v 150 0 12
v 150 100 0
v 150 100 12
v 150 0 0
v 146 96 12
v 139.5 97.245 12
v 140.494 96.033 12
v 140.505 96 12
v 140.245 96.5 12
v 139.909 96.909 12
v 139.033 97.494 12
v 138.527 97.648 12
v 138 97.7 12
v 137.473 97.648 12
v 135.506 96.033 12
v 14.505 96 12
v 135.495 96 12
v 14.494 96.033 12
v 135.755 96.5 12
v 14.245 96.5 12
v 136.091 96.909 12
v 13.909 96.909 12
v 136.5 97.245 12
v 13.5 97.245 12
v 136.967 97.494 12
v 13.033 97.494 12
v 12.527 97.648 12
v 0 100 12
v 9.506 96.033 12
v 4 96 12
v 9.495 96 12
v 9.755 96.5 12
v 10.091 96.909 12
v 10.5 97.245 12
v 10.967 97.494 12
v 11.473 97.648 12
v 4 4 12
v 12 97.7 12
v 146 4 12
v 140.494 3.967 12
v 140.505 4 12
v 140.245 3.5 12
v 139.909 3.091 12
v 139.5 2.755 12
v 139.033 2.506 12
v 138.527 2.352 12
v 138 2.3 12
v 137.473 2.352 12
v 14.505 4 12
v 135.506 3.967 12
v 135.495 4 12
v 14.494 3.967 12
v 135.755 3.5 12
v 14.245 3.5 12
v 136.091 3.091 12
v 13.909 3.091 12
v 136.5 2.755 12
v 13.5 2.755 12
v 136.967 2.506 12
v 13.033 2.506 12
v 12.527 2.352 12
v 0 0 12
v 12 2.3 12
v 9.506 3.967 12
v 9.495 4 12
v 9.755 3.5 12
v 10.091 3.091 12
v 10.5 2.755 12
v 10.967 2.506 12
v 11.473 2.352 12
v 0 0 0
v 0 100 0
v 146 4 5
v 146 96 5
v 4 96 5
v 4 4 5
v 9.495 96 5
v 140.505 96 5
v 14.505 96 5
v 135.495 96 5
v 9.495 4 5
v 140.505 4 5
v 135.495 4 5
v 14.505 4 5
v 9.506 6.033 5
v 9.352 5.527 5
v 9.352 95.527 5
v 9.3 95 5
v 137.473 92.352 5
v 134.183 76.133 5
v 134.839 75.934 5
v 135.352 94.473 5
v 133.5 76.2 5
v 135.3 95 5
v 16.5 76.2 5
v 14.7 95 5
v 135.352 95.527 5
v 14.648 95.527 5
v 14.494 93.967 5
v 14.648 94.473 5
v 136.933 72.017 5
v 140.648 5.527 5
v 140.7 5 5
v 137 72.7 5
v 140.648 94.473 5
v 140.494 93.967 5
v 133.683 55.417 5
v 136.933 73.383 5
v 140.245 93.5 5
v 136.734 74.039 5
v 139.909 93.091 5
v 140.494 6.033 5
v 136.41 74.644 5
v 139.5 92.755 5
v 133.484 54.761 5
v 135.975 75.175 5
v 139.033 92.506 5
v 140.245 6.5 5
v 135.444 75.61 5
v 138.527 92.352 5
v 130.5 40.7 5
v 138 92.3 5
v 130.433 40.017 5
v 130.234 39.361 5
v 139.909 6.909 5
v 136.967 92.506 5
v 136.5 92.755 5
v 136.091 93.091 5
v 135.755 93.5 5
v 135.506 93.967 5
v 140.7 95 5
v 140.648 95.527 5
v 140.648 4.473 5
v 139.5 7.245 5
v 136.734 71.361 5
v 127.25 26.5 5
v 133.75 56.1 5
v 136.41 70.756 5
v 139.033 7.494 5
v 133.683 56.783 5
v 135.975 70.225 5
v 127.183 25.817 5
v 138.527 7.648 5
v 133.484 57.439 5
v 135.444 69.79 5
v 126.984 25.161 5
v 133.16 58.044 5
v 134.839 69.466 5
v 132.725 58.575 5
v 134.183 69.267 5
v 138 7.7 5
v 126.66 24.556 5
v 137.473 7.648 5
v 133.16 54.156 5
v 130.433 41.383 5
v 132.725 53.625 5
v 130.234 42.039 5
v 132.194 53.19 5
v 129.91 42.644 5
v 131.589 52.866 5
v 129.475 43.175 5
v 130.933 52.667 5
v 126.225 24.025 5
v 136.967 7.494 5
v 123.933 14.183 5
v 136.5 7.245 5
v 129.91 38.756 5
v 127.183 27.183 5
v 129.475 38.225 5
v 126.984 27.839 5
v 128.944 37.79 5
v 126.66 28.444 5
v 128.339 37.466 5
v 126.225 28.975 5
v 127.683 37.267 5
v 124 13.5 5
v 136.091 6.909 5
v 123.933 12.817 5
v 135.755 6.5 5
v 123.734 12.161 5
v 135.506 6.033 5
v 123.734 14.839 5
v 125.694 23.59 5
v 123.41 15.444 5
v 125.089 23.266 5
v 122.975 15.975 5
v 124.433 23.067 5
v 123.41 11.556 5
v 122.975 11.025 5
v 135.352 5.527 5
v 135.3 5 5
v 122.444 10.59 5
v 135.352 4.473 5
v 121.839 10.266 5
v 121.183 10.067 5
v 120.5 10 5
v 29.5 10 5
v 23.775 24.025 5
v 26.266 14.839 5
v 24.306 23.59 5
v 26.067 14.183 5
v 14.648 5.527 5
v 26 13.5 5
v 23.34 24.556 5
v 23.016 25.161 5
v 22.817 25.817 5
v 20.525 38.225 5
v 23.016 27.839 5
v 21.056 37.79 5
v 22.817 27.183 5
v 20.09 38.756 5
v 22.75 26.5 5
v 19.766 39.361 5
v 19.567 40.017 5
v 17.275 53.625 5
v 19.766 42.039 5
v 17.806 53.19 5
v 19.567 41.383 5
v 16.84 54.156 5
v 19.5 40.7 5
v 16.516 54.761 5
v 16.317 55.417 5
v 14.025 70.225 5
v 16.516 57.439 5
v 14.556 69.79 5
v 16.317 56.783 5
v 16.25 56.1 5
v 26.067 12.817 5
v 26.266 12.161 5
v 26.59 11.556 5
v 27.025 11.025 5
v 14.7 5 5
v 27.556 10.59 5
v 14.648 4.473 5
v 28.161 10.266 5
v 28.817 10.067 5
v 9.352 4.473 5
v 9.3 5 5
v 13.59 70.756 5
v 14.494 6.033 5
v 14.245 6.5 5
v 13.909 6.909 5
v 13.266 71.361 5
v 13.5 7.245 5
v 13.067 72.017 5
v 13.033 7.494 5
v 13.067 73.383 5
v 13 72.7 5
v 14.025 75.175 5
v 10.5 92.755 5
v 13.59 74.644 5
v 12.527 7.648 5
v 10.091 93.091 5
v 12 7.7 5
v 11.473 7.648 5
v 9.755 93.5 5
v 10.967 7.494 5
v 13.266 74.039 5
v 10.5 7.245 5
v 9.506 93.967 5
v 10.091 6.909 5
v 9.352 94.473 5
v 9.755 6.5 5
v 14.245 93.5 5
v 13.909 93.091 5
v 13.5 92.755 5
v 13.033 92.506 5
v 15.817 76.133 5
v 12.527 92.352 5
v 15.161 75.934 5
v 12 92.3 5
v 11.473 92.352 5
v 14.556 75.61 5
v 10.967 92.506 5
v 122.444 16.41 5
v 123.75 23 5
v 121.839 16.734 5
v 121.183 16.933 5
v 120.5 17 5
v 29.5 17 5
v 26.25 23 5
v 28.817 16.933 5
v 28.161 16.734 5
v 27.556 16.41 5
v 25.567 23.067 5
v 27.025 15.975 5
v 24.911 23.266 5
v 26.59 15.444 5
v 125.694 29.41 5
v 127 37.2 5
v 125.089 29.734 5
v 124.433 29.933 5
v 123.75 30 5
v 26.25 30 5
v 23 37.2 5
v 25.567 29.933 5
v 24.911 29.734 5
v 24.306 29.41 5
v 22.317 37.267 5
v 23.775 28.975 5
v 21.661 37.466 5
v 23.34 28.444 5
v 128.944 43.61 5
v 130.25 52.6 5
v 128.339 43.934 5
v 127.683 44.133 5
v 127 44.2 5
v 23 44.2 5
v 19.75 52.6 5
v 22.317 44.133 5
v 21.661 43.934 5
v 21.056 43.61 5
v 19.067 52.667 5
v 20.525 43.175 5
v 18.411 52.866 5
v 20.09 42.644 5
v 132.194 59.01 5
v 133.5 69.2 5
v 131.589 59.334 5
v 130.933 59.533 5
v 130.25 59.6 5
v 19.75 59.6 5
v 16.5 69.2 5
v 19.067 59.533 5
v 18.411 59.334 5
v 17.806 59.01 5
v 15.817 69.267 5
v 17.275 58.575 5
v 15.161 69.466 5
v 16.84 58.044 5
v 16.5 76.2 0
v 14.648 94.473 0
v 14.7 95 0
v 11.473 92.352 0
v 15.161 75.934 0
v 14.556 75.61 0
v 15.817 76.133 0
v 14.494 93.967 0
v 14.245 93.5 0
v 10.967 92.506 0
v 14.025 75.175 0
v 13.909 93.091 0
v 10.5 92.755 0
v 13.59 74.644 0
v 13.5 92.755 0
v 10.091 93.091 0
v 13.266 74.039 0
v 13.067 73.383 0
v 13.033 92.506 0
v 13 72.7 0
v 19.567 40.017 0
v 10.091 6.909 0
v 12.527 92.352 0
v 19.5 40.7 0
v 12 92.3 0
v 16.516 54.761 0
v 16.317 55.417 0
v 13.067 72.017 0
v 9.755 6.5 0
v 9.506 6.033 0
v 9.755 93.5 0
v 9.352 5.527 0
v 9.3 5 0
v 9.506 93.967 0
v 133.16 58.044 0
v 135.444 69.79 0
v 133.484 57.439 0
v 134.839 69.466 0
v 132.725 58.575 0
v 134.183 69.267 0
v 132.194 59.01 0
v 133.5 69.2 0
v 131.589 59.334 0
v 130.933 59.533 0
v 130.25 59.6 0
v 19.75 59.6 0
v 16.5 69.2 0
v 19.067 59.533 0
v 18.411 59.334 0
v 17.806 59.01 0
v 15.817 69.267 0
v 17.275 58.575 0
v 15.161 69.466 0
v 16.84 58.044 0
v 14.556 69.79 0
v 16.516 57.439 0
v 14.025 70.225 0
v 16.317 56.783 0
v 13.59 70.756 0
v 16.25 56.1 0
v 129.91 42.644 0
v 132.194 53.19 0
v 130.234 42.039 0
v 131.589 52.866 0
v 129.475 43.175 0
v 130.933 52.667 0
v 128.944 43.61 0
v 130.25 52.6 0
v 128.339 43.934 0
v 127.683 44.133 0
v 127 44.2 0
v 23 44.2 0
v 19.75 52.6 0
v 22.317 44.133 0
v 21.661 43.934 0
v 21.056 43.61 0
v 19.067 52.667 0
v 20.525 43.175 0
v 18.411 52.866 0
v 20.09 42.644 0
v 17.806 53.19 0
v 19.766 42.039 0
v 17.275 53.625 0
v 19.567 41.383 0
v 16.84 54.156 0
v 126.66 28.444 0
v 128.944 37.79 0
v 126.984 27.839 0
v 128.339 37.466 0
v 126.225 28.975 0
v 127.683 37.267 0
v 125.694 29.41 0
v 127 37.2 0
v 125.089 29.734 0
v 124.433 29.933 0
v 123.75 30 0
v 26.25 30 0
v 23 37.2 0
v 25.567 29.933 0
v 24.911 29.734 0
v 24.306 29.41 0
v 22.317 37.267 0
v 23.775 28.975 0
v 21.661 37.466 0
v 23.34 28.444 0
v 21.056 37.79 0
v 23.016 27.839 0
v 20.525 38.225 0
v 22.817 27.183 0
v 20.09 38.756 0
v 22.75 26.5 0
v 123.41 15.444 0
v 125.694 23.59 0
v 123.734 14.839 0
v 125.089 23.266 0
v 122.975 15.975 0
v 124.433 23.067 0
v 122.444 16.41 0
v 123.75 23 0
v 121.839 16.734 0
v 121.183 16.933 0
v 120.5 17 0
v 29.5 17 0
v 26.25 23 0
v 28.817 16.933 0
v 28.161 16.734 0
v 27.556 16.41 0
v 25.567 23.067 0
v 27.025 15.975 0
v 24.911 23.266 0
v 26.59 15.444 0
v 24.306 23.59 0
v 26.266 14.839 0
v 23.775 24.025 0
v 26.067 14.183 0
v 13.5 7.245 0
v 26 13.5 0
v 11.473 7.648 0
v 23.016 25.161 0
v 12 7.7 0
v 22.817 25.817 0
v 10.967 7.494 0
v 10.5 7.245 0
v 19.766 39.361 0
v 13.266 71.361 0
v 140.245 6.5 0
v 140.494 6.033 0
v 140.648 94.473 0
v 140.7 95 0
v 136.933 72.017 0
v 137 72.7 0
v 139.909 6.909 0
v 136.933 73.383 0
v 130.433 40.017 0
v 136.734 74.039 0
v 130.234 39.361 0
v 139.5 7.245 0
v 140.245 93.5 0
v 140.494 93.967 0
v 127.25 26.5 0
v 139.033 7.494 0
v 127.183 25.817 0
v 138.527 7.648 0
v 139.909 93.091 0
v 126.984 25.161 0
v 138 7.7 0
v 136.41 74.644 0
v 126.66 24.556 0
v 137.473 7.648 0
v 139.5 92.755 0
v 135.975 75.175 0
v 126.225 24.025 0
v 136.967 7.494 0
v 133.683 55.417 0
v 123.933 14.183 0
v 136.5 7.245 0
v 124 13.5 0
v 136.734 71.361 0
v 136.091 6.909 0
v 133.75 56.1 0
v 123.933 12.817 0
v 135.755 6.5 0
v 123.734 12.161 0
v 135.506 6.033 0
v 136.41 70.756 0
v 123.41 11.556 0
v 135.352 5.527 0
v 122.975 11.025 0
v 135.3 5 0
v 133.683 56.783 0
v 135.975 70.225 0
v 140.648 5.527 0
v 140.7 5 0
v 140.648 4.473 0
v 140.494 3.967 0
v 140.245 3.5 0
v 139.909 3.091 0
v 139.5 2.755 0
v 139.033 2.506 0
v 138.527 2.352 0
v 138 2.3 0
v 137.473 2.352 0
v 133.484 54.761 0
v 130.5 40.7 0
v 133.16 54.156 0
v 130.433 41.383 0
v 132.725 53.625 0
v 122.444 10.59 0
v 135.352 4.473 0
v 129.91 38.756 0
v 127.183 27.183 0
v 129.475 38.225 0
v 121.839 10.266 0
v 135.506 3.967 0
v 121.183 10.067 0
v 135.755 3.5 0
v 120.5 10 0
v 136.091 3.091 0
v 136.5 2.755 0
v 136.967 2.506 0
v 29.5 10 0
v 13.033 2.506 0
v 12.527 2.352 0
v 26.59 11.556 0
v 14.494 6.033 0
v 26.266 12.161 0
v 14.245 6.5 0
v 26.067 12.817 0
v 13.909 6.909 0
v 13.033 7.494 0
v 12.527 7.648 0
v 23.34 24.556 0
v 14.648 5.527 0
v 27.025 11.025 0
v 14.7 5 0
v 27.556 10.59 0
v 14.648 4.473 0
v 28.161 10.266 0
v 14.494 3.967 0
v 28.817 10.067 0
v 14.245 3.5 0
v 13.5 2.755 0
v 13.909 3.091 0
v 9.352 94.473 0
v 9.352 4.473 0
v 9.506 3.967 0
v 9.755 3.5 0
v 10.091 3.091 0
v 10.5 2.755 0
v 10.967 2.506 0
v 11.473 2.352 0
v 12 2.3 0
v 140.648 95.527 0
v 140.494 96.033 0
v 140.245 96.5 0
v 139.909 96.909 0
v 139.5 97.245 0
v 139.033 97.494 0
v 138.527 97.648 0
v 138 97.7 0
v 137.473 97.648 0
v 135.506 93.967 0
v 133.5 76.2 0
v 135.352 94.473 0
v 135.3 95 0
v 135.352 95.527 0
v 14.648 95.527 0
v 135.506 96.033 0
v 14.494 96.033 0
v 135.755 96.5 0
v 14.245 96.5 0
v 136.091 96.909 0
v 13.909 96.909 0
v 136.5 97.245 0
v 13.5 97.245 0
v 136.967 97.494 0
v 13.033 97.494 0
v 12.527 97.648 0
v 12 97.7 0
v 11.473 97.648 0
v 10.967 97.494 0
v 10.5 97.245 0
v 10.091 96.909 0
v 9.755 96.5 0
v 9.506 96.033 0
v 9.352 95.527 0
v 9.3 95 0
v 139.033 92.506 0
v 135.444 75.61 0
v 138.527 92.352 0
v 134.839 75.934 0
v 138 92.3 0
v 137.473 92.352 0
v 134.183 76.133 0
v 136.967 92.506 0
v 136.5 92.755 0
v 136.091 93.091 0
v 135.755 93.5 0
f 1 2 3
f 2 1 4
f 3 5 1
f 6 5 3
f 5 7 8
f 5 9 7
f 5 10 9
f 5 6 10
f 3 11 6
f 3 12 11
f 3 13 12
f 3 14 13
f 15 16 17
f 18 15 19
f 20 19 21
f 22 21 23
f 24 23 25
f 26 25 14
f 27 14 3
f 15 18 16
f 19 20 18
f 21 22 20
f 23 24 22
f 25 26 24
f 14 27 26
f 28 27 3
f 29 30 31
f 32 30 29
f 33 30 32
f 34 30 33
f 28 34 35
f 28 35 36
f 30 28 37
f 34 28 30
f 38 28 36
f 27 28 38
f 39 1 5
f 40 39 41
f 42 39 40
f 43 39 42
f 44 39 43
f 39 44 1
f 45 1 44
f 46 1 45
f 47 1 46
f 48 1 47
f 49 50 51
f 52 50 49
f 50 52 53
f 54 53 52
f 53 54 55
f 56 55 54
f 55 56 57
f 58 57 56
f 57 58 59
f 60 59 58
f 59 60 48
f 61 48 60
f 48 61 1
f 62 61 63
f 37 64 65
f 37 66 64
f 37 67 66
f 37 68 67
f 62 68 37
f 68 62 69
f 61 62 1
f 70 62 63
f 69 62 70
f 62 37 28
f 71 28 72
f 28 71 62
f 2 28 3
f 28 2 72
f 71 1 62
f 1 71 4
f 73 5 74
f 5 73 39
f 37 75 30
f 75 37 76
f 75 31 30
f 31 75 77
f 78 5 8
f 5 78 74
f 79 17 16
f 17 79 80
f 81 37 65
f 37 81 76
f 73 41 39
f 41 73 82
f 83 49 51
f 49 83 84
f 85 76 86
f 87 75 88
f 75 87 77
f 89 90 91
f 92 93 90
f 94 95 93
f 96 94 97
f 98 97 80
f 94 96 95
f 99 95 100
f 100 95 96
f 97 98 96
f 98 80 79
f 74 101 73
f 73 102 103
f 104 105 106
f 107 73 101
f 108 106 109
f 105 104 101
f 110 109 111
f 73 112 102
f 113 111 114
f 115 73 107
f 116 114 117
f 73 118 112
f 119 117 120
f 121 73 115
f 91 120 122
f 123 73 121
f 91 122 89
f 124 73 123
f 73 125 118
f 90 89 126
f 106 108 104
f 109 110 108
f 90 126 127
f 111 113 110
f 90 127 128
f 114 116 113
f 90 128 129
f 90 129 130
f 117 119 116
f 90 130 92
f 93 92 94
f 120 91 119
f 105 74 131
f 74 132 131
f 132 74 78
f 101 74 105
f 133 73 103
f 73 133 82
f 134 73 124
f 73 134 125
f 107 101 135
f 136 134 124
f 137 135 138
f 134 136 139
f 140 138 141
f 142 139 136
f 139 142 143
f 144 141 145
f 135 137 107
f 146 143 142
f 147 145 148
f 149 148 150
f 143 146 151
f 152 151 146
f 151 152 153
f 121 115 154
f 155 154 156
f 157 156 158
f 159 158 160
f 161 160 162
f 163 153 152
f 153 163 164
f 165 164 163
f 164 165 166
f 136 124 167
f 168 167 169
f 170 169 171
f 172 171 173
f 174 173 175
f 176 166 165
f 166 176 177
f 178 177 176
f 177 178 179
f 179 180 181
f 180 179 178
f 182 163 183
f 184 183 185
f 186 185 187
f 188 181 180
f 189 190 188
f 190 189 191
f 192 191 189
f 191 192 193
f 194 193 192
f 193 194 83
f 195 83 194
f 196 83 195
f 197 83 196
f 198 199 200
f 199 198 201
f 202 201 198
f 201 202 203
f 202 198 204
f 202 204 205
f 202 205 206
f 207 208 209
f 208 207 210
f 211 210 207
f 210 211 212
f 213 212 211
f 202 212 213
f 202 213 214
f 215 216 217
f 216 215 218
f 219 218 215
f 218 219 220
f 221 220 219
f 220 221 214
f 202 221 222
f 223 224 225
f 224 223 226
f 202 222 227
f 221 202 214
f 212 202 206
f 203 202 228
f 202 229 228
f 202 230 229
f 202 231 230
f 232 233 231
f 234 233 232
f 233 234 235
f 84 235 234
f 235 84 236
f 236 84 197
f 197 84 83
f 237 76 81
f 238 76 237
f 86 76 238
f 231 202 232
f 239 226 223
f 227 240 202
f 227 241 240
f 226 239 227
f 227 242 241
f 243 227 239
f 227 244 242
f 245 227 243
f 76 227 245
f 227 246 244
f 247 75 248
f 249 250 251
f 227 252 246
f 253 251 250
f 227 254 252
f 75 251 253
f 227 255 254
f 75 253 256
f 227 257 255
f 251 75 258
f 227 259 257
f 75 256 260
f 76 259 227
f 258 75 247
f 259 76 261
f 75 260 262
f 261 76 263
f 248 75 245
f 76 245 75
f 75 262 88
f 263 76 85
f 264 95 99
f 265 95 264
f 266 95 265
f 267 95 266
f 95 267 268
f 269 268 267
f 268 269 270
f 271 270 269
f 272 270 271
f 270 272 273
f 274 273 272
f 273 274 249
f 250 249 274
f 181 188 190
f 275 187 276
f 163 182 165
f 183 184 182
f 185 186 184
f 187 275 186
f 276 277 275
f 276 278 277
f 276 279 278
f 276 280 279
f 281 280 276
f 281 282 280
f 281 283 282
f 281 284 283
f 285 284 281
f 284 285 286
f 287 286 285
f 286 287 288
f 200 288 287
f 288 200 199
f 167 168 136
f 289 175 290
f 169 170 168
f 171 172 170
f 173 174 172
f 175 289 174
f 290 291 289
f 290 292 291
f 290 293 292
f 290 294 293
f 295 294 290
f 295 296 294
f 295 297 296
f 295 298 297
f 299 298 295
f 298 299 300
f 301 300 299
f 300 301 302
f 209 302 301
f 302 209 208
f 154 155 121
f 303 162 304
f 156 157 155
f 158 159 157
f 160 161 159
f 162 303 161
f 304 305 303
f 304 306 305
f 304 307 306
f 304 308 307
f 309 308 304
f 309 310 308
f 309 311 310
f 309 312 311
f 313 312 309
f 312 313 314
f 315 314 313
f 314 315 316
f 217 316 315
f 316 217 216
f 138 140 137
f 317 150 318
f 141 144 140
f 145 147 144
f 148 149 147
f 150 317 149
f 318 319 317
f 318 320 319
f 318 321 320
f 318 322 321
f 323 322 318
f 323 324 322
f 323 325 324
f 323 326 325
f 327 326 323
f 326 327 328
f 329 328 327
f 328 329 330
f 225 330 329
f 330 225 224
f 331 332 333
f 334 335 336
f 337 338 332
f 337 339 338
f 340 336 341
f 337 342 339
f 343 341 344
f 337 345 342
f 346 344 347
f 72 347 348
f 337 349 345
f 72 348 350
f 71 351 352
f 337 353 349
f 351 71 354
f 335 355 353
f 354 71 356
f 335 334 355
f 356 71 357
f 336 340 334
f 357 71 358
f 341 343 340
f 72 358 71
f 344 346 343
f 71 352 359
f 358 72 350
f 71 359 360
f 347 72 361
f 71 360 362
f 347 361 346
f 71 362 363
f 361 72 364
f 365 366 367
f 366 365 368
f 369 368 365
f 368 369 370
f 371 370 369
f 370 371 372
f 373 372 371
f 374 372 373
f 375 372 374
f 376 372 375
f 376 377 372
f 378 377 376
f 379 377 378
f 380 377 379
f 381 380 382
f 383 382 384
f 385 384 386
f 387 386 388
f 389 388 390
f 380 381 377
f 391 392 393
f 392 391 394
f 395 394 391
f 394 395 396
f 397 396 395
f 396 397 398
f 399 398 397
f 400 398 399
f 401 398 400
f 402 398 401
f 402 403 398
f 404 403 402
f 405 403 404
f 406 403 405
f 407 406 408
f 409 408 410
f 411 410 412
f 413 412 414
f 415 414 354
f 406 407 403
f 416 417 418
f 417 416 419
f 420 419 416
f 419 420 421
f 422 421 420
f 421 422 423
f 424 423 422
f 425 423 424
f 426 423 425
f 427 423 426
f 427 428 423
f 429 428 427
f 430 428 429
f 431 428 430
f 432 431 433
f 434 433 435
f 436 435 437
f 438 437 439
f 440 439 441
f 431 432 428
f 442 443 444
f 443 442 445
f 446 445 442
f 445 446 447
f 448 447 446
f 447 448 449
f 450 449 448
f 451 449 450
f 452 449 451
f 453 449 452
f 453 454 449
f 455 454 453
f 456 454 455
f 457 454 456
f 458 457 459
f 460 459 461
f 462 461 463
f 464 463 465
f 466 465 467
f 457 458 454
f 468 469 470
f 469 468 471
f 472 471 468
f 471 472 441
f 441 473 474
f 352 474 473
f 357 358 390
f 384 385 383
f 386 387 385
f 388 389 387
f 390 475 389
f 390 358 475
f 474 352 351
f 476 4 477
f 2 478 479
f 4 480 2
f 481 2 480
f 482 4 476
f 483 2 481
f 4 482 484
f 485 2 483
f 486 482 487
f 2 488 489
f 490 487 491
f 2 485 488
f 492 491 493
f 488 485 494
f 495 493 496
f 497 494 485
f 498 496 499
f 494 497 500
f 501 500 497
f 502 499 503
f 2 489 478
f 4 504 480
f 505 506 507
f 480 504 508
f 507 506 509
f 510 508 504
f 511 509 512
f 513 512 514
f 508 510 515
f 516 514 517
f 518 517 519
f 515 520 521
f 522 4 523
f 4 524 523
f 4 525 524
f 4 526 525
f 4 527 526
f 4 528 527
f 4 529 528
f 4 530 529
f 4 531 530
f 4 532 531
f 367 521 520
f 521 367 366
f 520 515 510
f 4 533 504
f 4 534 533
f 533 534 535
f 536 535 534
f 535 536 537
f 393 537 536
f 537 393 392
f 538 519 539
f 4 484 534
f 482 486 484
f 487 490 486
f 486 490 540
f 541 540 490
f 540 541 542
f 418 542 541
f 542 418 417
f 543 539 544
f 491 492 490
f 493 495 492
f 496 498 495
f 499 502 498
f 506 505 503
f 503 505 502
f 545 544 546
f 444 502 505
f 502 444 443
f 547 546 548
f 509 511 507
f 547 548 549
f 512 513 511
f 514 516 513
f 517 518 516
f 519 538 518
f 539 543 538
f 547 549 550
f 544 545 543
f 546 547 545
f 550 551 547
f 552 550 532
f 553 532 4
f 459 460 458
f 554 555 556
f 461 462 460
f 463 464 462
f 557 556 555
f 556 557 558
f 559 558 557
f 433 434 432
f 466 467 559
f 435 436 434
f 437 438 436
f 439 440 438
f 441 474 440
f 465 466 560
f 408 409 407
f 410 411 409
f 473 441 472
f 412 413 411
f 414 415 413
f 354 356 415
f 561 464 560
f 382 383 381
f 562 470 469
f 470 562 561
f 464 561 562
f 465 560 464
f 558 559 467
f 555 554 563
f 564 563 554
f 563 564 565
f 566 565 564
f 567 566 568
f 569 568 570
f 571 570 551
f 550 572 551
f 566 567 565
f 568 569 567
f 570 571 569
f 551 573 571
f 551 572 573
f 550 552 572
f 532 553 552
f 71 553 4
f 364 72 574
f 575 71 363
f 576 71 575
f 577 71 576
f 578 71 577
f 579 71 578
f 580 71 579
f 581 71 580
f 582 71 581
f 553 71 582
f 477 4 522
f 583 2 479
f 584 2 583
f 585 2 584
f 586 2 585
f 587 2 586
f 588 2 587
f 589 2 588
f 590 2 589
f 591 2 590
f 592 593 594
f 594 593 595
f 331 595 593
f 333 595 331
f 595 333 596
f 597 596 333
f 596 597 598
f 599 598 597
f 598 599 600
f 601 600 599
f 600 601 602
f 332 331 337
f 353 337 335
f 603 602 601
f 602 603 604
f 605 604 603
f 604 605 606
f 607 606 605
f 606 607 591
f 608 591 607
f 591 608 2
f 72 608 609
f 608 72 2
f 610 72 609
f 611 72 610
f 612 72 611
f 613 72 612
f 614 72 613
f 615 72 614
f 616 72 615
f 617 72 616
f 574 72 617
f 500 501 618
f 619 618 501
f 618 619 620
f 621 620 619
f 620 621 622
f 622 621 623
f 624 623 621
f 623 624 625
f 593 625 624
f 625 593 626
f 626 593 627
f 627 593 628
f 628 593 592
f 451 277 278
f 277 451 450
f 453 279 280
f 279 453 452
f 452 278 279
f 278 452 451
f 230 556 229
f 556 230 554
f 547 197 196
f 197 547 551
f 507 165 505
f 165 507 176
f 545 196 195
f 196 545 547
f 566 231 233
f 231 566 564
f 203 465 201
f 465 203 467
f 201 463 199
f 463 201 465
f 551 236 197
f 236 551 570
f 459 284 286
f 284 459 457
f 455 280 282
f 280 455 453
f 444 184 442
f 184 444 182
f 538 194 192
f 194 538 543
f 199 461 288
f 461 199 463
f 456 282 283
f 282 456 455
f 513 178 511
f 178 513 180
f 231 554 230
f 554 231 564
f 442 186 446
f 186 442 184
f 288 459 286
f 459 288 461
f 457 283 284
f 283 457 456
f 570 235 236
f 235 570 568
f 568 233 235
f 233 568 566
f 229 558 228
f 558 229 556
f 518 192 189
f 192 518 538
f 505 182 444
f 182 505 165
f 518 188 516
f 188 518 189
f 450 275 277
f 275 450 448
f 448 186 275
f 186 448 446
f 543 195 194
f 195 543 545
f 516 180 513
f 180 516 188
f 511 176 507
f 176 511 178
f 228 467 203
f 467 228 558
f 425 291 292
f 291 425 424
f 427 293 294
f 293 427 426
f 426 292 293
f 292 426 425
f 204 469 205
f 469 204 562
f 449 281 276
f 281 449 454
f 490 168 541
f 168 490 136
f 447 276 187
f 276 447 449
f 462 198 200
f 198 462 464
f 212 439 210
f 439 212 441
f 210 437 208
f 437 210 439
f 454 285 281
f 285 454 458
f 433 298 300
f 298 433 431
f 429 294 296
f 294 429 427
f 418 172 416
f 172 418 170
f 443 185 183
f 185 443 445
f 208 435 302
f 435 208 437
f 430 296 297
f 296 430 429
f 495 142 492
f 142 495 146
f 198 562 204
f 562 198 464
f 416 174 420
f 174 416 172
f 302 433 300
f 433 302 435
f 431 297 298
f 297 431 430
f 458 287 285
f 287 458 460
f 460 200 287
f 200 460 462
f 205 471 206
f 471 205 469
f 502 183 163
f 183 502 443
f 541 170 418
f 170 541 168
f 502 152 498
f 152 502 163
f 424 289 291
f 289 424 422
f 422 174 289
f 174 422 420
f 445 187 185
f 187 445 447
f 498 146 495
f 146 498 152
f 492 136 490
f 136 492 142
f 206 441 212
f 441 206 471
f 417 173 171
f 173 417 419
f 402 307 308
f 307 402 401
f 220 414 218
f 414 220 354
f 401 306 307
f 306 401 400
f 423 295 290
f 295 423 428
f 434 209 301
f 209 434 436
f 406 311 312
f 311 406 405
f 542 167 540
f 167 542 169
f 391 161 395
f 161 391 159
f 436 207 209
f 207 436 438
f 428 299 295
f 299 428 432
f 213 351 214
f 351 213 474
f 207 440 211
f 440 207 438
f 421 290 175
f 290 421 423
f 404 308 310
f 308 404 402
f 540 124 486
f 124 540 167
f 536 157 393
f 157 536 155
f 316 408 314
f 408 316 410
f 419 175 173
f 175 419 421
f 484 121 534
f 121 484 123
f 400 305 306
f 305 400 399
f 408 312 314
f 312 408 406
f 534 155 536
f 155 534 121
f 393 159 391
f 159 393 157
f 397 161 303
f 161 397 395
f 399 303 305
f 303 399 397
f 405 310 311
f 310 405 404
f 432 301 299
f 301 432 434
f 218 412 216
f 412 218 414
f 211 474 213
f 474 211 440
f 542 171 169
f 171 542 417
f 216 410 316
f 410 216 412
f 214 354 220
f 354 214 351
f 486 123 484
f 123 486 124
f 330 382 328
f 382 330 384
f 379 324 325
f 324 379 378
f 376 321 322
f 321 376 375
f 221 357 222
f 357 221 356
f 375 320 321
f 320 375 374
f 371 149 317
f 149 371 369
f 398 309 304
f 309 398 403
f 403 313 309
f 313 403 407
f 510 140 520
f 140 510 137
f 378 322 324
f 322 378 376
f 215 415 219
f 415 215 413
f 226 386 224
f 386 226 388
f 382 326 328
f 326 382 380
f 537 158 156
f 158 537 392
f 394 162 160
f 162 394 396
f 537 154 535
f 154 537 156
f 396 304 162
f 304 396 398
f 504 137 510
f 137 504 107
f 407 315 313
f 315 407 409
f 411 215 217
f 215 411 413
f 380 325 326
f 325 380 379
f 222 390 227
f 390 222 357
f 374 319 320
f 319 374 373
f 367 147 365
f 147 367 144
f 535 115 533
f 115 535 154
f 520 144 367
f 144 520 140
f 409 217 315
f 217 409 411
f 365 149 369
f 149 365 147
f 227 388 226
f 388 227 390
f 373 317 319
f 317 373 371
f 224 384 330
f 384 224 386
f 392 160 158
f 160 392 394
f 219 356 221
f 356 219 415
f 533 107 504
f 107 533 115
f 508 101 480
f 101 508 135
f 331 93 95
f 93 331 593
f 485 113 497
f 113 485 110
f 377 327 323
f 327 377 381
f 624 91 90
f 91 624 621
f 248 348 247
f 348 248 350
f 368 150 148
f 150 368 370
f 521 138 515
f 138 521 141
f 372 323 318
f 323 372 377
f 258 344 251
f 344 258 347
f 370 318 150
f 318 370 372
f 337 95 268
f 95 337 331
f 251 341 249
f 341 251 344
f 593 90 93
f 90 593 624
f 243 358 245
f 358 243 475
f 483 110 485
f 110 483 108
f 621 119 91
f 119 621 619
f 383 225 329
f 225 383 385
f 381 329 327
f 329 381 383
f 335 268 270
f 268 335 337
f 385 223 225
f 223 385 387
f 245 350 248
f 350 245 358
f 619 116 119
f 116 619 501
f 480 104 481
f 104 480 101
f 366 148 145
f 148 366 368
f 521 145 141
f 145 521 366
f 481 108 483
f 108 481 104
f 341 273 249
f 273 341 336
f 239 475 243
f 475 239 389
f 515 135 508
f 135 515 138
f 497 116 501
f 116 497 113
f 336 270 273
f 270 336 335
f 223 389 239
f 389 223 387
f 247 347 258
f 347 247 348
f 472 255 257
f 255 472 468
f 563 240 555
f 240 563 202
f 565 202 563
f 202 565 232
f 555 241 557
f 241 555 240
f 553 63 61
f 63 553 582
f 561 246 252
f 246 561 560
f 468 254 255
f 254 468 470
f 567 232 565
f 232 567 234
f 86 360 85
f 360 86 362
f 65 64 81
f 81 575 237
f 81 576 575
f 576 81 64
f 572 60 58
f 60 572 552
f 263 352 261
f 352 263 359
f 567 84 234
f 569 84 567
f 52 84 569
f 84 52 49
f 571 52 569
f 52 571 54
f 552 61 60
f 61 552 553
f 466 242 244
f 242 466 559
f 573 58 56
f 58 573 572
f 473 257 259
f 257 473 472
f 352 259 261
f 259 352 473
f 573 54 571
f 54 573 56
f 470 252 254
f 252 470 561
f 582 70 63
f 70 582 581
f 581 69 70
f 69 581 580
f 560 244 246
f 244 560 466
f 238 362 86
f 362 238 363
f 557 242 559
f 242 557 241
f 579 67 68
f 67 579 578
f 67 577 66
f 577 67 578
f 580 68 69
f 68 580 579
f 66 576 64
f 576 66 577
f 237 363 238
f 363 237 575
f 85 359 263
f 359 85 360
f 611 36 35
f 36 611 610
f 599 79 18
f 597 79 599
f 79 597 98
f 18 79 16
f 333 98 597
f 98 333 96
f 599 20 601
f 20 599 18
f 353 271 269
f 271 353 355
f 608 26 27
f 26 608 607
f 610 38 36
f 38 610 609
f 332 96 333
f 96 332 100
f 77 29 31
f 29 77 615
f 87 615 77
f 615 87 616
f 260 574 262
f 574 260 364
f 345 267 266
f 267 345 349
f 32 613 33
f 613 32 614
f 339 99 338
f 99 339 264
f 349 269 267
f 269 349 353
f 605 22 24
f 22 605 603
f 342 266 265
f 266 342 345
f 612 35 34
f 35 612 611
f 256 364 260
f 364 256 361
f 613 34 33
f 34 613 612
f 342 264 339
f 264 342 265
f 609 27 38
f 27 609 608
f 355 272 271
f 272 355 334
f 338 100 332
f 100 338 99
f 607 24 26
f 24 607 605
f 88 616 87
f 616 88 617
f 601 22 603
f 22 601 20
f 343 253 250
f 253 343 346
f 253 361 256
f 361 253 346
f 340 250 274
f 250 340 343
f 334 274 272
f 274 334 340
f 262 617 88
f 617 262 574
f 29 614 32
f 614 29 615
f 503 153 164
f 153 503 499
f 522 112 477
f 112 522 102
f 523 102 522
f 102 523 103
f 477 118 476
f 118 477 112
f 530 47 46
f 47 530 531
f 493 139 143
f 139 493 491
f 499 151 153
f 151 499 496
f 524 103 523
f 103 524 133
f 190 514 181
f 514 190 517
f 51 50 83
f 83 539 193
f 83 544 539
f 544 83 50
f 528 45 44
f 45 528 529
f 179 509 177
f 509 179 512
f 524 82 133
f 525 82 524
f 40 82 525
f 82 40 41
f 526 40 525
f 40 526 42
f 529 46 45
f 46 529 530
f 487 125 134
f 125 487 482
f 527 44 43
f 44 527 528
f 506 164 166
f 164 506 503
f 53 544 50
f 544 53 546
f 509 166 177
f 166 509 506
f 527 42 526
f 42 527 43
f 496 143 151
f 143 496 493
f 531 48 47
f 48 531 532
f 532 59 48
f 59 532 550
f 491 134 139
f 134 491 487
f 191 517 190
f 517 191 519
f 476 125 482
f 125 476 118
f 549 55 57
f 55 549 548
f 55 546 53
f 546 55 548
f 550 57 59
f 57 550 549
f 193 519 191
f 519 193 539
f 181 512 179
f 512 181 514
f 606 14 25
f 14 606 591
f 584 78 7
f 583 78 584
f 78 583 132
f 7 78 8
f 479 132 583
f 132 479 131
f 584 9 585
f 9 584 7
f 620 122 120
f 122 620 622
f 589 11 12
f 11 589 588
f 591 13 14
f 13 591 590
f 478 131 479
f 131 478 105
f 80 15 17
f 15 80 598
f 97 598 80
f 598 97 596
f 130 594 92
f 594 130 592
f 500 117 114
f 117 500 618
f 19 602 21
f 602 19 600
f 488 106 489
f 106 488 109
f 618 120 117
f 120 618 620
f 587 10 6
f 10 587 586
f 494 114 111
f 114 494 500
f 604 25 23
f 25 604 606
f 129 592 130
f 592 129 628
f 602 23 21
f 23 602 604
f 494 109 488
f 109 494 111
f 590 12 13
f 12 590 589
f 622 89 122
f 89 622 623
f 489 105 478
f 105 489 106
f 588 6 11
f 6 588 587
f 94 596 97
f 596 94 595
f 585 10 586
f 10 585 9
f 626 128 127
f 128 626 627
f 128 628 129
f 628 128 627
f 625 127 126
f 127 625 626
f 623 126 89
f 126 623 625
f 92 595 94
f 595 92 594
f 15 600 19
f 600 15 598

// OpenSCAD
$fn = 32;

// ----------------------------------------------------------------------
// Slotted panel: 150 x 100 mm, 5 рядов of slots
// ----------------------------------------------------------------------

// --- parameters (mm) ---
panel_w = 150;            // panel width
panel_d = 100;            // panel depth
thick = 5;                // panel thickness
slot_w = 7;               // slot width
pitch0 = 13;              // first row pitch
pitch_step = 1.2;         // pitch increase per row
margin = 10;              // margin around the slot field
rows = 5;                 // number of slot rows
mount_d = 5.4;            // mounting holes
mount_x = 63;             // mounting hole offset
rim_h = 12;               // rim height
rim_t = 4;                // rim wall thickness

difference() {
  union() {
    cube([panel_w, panel_d, thick]);
    translate([0, 0, thick - 1]) difference() {
      cube([panel_w, panel_d, rim_h - thick + 1]);
      translate([rim_t, rim_t, -2.5]) cube([panel_w - 2 * rim_t, panel_d - 2 * rim_t, rim_h - thick + 6]);
    }
  }
  /* slot rows: stadium shaped cutters, 2.5 mm clear of both faces */
  /* row 0: pitch 13, length 91 */
  hull() {
    translate([29.5, 13.5, -2.5]) cylinder(h = thick + 5, d = slot_w);
    translate([120.5, 13.5, -2.5]) cylinder(h = thick + 5, d = slot_w);
  }
  /* row 1: pitch 14.2, length 97.5 */
  hull() {
    translate([26.25, 26.5, -2.5]) cylinder(h = thick + 5, d = slot_w);
    translate([123.75, 26.5, -2.5]) cylinder(h = thick + 5, d = slot_w);
  }
  /* row 2: pitch 15.4, length 104 */
  hull() {
    translate([23, 40.7, -2.5]) cylinder(h = thick + 5, d = slot_w);
    translate([127, 40.7, -2.5]) cylinder(h = thick + 5, d = slot_w);
  }
  /* row 3: pitch 16.6, length 110.5 */
  hull() {
    translate([19.75, 56.1, -2.5]) cylinder(h = thick + 5, d = slot_w);
    translate([130.25, 56.1, -2.5]) cylinder(h = thick + 5, d = slot_w);
  }
  /* row 4: pitch 17.8, length 117 */
  hull() {
    translate([16.5, 72.7, -2.5]) cylinder(h = thick + 5, d = slot_w);
    translate([133.5, 72.7, -2.5]) cylinder(h = thick + 5, d = slot_w);
  }
  translate([12, 5, -2.5]) cylinder(h = 17, d = mount_d);
  translate([12, 95, -2.5]) cylinder(h = 17, d = mount_d);
  translate([138, 5, -2.5]) cylinder(h = 17, d = mount_d);
  translate([138, 95, -2.5]) cylinder(h = 17, d = mount_d);
}
